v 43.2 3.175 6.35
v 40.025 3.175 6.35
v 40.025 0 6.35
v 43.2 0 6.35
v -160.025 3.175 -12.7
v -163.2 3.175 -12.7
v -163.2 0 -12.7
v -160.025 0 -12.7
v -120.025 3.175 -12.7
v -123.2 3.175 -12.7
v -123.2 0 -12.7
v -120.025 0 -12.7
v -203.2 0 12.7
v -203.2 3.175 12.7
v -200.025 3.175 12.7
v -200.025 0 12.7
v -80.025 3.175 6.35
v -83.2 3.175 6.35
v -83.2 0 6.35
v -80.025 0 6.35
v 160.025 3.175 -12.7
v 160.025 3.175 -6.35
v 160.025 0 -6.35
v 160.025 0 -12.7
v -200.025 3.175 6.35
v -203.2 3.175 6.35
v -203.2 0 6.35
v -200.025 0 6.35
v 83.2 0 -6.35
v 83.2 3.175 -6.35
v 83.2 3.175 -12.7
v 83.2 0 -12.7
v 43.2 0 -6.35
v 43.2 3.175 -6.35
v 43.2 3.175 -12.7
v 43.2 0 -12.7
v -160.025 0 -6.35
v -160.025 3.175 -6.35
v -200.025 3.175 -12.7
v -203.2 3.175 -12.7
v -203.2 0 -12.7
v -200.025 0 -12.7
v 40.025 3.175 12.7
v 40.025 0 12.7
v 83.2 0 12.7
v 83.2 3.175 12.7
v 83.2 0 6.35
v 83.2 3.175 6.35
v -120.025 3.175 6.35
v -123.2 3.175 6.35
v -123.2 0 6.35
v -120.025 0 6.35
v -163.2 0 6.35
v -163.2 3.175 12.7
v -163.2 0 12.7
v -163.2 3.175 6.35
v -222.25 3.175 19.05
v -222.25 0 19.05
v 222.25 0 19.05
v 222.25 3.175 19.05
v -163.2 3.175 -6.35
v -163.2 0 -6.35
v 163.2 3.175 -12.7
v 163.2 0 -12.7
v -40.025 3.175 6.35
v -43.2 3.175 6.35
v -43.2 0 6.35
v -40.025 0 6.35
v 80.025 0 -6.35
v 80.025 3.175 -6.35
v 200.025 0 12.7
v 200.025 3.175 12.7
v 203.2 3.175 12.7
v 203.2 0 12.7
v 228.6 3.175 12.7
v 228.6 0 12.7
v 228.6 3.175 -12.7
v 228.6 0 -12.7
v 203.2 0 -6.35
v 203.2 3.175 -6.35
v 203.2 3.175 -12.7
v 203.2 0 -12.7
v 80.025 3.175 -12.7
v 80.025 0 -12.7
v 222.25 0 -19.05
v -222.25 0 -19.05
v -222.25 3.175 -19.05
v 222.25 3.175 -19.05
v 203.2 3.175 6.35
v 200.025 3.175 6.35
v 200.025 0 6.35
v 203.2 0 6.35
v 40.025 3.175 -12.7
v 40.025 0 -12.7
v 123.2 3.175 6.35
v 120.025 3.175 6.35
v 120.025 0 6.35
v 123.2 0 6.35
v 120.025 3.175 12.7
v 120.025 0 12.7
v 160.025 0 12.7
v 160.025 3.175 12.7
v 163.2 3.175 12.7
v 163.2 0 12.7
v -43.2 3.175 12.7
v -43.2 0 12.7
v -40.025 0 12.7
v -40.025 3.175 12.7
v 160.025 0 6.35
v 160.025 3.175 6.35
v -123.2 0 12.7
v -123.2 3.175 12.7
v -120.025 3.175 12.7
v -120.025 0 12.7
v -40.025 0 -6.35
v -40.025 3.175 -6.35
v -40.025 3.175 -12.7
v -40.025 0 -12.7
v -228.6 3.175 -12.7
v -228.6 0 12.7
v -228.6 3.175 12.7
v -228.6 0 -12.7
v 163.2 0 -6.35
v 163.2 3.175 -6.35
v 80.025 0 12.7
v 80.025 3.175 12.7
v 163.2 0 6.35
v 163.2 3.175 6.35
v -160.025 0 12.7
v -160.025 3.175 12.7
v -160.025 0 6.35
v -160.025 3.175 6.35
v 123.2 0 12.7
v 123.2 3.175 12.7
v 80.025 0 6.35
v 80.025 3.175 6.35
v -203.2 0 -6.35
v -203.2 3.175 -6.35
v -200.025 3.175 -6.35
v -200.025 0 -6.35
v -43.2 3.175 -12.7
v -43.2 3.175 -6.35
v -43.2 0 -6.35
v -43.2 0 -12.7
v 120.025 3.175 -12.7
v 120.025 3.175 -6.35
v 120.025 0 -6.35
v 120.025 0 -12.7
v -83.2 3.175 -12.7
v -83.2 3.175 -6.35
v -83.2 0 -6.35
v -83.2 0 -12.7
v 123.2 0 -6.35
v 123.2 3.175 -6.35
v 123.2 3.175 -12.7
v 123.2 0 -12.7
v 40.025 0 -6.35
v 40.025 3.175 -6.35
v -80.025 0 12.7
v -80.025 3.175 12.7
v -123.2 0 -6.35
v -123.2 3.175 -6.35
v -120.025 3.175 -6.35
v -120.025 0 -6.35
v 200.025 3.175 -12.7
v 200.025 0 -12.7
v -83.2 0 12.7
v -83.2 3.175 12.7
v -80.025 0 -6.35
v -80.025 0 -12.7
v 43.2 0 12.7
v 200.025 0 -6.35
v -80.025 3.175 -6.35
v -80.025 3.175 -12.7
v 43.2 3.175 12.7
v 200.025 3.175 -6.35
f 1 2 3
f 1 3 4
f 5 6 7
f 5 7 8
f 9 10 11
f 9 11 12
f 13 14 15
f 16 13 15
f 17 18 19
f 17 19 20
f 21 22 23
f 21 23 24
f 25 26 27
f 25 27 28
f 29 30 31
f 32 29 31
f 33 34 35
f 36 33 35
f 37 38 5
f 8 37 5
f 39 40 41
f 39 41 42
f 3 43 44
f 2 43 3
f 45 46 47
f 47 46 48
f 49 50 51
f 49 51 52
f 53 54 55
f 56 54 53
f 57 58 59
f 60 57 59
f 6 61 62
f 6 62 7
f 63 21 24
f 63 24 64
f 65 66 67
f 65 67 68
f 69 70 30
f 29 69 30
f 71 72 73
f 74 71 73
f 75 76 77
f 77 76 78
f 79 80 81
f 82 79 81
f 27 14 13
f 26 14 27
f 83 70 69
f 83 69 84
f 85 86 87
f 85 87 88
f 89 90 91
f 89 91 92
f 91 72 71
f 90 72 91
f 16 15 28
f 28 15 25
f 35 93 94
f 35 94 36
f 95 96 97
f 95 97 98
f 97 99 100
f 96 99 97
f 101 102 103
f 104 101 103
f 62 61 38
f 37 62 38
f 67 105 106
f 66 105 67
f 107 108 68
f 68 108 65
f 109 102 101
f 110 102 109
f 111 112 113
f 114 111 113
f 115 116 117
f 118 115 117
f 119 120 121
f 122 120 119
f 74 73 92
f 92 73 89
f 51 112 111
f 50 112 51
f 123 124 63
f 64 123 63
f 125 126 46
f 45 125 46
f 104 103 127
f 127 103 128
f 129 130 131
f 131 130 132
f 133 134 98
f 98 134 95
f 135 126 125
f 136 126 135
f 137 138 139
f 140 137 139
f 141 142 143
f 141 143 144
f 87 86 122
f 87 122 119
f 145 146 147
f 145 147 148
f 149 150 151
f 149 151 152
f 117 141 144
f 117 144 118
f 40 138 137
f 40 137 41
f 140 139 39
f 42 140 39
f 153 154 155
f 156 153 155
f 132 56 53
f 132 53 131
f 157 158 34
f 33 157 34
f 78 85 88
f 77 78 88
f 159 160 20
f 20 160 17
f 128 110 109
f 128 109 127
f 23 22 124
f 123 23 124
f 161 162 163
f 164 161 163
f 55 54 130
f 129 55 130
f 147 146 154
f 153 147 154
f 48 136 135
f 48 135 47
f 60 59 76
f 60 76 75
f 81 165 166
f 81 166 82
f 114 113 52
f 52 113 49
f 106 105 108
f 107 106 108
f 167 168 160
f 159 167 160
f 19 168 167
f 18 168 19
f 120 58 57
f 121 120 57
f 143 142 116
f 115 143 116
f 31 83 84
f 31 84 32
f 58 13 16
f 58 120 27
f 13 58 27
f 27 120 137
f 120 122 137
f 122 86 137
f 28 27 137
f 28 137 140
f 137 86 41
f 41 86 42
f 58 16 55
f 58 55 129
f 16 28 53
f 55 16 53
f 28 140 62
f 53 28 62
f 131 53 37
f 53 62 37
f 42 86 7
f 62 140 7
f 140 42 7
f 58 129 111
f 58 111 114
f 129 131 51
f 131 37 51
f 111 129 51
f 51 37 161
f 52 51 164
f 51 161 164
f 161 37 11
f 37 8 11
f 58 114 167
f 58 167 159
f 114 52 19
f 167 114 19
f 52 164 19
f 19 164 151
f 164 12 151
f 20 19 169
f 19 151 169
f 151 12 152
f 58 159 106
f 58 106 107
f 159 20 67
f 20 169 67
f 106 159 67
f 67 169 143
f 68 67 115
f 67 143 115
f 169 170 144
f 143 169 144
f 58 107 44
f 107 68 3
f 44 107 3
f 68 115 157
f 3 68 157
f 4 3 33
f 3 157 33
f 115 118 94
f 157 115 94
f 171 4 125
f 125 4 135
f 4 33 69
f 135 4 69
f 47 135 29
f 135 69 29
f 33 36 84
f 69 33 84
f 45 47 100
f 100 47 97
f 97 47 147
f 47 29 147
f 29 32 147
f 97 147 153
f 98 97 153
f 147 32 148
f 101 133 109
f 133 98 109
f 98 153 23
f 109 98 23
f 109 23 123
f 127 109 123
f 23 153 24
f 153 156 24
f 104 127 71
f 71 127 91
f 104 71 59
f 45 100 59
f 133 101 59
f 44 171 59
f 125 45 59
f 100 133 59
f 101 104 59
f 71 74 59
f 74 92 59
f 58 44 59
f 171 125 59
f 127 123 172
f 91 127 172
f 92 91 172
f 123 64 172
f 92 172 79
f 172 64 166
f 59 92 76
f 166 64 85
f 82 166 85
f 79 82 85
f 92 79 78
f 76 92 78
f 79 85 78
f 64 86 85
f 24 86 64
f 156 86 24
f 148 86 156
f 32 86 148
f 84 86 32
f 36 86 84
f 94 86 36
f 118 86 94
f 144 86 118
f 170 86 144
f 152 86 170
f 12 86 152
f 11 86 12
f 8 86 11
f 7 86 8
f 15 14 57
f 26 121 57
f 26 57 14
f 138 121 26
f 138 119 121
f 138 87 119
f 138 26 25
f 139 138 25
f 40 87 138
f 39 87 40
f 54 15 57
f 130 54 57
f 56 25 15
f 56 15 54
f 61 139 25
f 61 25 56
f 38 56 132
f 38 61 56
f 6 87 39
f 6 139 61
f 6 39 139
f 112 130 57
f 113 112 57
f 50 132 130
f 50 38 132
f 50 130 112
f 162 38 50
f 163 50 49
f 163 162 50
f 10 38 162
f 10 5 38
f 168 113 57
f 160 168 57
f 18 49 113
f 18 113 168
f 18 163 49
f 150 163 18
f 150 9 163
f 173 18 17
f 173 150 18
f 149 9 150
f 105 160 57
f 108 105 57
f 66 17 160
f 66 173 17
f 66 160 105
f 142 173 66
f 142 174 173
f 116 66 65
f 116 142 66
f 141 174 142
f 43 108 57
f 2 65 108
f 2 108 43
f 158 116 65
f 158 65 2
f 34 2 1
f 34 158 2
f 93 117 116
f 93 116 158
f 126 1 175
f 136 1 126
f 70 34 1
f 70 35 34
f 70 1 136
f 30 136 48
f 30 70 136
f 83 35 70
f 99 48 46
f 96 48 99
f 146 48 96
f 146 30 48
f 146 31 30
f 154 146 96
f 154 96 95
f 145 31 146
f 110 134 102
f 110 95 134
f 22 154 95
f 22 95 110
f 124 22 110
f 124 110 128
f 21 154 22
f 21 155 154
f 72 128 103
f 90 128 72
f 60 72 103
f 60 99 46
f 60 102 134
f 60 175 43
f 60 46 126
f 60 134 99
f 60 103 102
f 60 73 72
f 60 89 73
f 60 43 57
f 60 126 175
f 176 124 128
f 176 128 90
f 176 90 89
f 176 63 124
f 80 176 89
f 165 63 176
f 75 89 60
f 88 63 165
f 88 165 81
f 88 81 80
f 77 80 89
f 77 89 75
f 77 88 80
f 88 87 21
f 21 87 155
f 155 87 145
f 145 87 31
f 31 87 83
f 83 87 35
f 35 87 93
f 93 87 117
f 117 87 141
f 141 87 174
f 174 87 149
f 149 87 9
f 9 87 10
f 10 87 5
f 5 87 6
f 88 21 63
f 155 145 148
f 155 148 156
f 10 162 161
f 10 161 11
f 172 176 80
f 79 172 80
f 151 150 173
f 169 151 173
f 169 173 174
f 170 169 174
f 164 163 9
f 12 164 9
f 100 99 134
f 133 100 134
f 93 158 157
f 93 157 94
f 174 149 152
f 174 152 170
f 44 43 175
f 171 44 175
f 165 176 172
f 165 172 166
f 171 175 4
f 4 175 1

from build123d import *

# Parameters (mm, degrees)
SKETCH1_W           = 457.2
SKETCH1_H           = 38.1
BOSS_EXTRUDE1_DEPTH = 3.175
SKETCH2_W           = 3.175
SKETCH2_H           = 6.35
CUT_EXTRUDE1_DEPTH  = 6.35
CHAMFER1_SIZE       = 6.35


with BuildPart() as part:
    # Sketch1 → Boss-Extrude1 (new body)
    with BuildSketch(Plane(origin=(0, 0, 0), x_dir=(1, 0, 0), z_dir=(0, 1, 0))):
        Rectangle(SKETCH1_W, SKETCH1_H)
    extrude(amount=BOSS_EXTRUDE1_DEPTH)

    # Sketch2 → Cut-Extrude1 (cut)
    with BuildSketch(Plane(origin=(0, 3.175, 0), x_dir=(1, 0, 0), z_dir=(0, 1, 0))):
        with Locations((-201.6125, 9.525)):
            Rectangle(SKETCH2_W, SKETCH2_H)
        with Locations((-201.6125, -9.525)):
            Rectangle(SKETCH2_W, SKETCH2_H)
        with Locations((201.6125, 9.525)):
            Rectangle(SKETCH2_W, SKETCH2_H)
        with Locations((201.6125, -9.525)):
            Rectangle(SKETCH2_W, SKETCH2_H)
        with Locations((-161.6125, 9.525)):
            Rectangle(SKETCH2_W, SKETCH2_H)
        with Locations((-161.6125, -9.525)):
            Rectangle(SKETCH2_W, SKETCH2_H)
        with Locations((-121.6125, 9.525)):
            Rectangle(SKETCH2_W, SKETCH2_H)
        with Locations((-121.6125, -9.525)):
            Rectangle(SKETCH2_W, SKETCH2_H)
        with Locations((-81.6125, 9.525)):
            Rectangle(SKETCH2_W, SKETCH2_H)
        with Locations((-81.6125, -9.525)):
            Rectangle(SKETCH2_W, SKETCH2_H)
        with Locations((-41.6125, 9.525)):
            Rectangle(SKETCH2_W, SKETCH2_H)
        with Locations((-41.6125, -9.525)):
            Rectangle(SKETCH2_W, SKETCH2_H)
        with Locations((41.6125, -9.525)):
            Rectangle(SKETCH2_W, SKETCH2_H)
        with Locations((41.6125, 9.525)):
            Rectangle(SKETCH2_W, SKETCH2_H)
        with Locations((81.6125, -9.525)):
            Rectangle(SKETCH2_W, SKETCH2_H)
        with Locations((81.6125, 9.525)):
            Rectangle(SKETCH2_W, SKETCH2_H)
        with Locations((121.6125, -9.525)):
            Rectangle(SKETCH2_W, SKETCH2_H)
        with Locations((121.6125, 9.525)):
            Rectangle(SKETCH2_W, SKETCH2_H)
        with Locations((161.6125, -9.525)):
            Rectangle(SKETCH2_W, SKETCH2_H)
        with Locations((161.6125, 9.525)):
            Rectangle(SKETCH2_W, SKETCH2_H)
    extrude(amount=-CUT_EXTRUDE1_DEPTH, mode=Mode.SUBTRACT)

    # Chamfer1
    chamfer1_edges = [part.edges().sort_by_distance(p)[0] for p in [
        (228.6, 1.5875, 19.05),
        (-228.6, 1.5875, 19.05),
        (-228.6, 1.5875, -19.05),
        (228.6, 1.5875, -19.05),
    ]]
    chamfer(chamfer1_edges, length=CHAMFER1_SIZE)


solid = part.part
